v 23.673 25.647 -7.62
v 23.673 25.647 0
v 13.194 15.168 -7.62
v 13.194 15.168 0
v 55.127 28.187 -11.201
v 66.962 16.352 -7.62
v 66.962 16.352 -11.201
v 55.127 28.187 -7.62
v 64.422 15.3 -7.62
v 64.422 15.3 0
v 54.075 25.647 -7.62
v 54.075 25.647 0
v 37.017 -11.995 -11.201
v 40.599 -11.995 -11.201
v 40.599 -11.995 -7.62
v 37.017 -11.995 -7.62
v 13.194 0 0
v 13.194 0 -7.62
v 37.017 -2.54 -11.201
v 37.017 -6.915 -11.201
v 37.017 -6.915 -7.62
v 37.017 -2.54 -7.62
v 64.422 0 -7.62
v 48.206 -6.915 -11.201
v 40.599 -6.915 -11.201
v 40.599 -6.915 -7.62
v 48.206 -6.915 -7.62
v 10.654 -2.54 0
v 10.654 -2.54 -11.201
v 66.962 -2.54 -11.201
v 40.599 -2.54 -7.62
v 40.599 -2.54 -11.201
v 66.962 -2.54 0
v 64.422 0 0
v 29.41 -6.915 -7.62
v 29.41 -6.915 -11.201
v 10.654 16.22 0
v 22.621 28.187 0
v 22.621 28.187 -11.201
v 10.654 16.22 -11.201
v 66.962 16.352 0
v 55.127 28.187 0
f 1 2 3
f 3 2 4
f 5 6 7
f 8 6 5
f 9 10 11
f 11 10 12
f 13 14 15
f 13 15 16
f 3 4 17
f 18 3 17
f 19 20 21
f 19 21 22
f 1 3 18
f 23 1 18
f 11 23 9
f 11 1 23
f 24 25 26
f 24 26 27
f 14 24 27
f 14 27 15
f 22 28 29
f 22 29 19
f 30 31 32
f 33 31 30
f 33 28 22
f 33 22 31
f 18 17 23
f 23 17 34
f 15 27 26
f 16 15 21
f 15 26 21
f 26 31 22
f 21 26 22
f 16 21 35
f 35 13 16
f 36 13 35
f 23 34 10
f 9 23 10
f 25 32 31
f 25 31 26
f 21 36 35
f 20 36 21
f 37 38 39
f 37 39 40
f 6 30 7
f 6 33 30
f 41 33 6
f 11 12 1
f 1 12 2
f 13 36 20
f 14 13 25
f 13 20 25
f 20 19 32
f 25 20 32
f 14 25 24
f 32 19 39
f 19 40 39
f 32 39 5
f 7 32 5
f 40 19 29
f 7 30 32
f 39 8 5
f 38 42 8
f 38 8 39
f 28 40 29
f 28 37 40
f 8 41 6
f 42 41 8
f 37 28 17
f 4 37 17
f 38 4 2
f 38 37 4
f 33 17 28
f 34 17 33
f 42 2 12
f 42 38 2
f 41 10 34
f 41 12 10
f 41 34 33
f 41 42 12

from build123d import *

# Parameters (mm, degrees)
BOSS_EXTRUDE4_DEPTH = 7.62
BOSS_EXTRUDE5_DEPTH = 3.5814
BOSS_EXTRUDE6_DEPTH = 3.5814


with BuildPart() as part:
    # Sketch17 → Boss-Extrude4 (new body)
    with BuildSketch(Plane(origin=(57.616701934, 0, 0), x_dir=(-1, 0, 0), z_dir=(0, 0, -1))):
        Polygon((-9.344833285, -2.54), (-9.344833285, 16.351663206), (2.490045751, 28.186542241), (34.995614796, 28.186542241), (46.962246821, 16.219910216), (46.962246821, -2.54), align=None)
        Polygon((-6.804833285, 0), (-6.804833285, 15.299560757), (3.542148199, 25.646542241), (33.943512348, 25.646542241), (44.422246821, 15.167807768), (44.422246821, 0), align=None, mode=Mode.SUBTRACT)
    extrude(amount=BOSS_EXTRUDE4_DEPTH)

    # Sketch20 → Boss-Extrude5 (add)
    with BuildSketch(Plane(origin=(0, 0, -7.62), x_dir=(-1, 0, 0), z_dir=(0, 0, -1))):
        Polygon((-66.961535219, -2.54), (-66.961535219, 16.351663206), (-55.126656184, 28.186542241), (-22.621087138, 28.186542241), (-10.654455113, 16.219910216), (-10.654455113, -2.54), align=None)
    extrude(amount=BOSS_EXTRUDE5_DEPTH)

    # Sketch21 → Boss-Extrude6 (add)
    with BuildSketch(Plane(origin=(0, 0, -11.2014), x_dir=(-1, 0, 0), z_dir=(0, 0, -1))):
        Polygon((-40.598695166, -6.9149976), (-48.205995166, -6.9149976), (-40.598695166, -11.9949976), (-37.017295166, -11.9949976), (-29.409995166, -6.9149976), (-37.017295166, -6.9149976), (-37.017295166, -2.54), (-40.598695166, -2.54), align=None)
    extrude(amount=-BOSS_EXTRUDE6_DEPTH)


solid = part.part
